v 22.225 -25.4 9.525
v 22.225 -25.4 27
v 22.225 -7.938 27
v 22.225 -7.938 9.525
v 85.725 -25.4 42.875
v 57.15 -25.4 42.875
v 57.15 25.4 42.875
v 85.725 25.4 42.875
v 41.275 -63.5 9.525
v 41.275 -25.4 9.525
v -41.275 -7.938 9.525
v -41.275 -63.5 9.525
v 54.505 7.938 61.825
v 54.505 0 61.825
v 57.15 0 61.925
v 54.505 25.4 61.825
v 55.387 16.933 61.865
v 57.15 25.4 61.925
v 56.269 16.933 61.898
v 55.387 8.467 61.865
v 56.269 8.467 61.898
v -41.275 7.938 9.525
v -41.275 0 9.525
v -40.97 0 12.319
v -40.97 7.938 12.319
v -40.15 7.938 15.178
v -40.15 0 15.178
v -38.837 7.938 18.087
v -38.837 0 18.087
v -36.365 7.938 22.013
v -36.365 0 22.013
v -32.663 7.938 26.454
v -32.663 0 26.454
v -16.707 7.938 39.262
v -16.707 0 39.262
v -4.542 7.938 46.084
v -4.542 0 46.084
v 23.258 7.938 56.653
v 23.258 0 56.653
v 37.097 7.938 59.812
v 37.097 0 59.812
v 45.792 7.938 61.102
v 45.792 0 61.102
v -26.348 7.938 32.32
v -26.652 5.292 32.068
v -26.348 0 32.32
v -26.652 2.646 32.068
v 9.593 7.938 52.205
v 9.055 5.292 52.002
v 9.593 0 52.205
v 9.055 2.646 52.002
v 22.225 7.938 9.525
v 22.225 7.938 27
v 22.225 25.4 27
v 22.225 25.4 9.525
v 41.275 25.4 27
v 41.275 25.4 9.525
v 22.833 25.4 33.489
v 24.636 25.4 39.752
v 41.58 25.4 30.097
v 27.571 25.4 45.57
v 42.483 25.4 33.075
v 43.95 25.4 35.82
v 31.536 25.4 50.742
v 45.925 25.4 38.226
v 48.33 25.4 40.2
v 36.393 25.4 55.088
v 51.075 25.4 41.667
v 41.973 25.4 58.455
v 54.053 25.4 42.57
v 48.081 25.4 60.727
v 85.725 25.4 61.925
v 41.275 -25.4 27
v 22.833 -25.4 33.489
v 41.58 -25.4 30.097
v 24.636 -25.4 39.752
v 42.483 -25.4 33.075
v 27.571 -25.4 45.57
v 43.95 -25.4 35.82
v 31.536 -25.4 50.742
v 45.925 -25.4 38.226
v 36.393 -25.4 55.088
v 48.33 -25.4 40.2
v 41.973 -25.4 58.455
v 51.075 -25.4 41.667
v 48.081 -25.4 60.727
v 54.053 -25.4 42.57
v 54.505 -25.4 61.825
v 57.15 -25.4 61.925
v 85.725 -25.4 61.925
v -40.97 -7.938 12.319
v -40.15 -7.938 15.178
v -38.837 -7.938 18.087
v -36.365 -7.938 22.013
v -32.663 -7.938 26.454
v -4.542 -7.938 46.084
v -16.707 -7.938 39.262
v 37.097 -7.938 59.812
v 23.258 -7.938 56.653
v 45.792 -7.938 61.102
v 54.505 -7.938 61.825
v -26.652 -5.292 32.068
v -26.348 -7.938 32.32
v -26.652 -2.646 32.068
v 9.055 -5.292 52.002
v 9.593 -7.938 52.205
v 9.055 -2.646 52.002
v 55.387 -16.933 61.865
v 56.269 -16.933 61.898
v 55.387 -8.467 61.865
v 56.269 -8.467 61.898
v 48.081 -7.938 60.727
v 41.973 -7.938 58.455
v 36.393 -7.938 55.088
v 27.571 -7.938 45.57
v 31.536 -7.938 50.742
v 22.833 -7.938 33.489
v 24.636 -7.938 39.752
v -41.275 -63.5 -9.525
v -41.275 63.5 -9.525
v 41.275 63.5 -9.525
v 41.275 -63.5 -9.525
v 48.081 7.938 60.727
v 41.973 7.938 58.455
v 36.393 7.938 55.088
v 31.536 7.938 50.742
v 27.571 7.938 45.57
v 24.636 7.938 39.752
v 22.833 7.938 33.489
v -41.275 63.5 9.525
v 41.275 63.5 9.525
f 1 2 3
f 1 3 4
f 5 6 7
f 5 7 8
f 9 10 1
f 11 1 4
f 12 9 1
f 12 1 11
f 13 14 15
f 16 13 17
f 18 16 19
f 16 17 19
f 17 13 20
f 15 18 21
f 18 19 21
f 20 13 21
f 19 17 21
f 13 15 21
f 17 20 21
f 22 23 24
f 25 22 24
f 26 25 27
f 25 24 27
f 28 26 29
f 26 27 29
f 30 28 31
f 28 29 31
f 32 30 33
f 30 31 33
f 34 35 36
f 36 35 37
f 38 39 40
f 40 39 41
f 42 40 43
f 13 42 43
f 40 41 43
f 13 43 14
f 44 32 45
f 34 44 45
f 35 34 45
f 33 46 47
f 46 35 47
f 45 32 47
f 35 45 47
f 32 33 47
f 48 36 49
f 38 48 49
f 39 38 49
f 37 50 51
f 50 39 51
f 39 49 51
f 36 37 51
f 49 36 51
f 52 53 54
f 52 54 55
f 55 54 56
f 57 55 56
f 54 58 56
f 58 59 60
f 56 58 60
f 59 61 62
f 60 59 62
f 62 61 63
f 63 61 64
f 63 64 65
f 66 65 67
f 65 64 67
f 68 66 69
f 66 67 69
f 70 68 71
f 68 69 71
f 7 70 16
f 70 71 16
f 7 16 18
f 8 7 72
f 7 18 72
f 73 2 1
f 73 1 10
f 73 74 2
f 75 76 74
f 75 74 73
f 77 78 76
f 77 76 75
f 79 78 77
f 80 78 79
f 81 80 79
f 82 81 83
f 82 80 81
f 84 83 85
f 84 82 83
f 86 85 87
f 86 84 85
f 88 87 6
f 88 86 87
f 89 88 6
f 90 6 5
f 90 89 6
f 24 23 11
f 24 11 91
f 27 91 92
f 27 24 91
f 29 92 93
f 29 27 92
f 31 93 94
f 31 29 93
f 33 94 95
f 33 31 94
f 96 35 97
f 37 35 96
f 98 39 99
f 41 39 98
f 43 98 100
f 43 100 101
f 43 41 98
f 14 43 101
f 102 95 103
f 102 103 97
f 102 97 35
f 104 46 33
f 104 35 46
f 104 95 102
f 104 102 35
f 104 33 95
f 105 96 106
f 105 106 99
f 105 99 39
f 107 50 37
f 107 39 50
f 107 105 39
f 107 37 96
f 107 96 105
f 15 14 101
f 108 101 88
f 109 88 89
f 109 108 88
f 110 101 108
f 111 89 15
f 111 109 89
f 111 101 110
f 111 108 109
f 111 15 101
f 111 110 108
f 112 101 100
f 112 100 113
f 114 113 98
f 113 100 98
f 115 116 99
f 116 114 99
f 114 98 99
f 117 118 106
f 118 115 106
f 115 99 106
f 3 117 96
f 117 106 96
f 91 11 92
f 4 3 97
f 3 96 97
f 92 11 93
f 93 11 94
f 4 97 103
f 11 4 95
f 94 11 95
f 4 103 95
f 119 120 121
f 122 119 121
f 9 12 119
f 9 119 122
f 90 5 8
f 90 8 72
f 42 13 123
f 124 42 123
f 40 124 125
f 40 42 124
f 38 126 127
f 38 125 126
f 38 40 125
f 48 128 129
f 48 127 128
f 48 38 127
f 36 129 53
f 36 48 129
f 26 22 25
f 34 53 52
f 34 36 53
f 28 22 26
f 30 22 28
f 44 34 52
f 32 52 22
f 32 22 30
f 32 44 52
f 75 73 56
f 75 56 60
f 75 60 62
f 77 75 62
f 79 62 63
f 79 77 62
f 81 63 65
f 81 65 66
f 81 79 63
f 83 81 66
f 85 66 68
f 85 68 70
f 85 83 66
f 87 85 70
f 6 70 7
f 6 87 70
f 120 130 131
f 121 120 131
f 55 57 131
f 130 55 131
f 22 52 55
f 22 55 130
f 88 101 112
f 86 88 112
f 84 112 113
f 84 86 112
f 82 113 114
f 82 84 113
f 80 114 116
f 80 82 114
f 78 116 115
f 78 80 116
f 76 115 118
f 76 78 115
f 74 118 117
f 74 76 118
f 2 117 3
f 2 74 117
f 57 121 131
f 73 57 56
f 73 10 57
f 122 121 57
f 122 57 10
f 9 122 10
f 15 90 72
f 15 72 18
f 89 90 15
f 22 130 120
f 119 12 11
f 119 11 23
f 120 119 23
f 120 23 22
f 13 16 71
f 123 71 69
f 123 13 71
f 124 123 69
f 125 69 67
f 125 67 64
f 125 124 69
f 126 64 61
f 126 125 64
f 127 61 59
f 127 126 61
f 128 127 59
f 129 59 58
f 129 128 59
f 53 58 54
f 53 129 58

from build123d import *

# Parameters (mm, degrees)
F1_DEPTH = 63.5
F0_W     = 25.4
F0_H     = 19.05
F2_DEPTH = 25.4
F3_DEPTH = 7.9375


with BuildPart() as f1:
    # F0 (on Front) → F1 (new body, symmetric)
    with BuildSketch(Plane.XZ):
        Polygon((22.225, 9.525), (-41.275, 9.525), (-41.275, -9.525), (41.275, -9.525), (41.275, 9.525), align=None)
    extrude(amount=F1_DEPTH, both=True)

    # F0 (on Front) → F2 (join, symmetric)
    with BuildSketch(Plane.XZ):
        with BuildLine():
            Line((22.225, 27.0002), (22.225, 9.525))
            Line((22.225, 9.525), (41.275, 9.525))
            Line((41.275, 9.525), (41.275, 27.0002))
            ThreePointArc((41.275, 27.0002), (45.9246798487, 38.2255201513), (57.15, 42.8752))
            Line((57.15, 42.8752), (60.325, 42.8752))
            Line((60.325, 42.8752), (60.325, 61.9252))
            Line((60.325, 61.9252), (57.15, 61.9252))
            add(Edge.make_bspline(
                [(54.5051235228, 61.8249075138), (55.3877284617, 61.8679154461), (56.2694699988, 61.9014230074), (57.15, 61.9252)],
                knots=[109.4292782466, 109.4292782466, 109.4292782466, 109.4292782466, 111.5045361635, 111.5045361635, 111.5045361635, 111.5045361635], degree=3))
            ThreePointArc((54.5051235228, 61.8249075138), (31.5362543156, 50.7423914957), (22.225, 27.0002))
        make_face()
        with Locations((73.025, 52.4002)):
            Rectangle(F0_W, F0_H)
    extrude(amount=F2_DEPTH, both=True)

    # F0 (on Front) → F3 (join, symmetric)
    with BuildSketch(Plane.XZ):
        with BuildLine():
            add(Edge.make_bspline(
                [(-41.275, 9.525), (-40.9758715935, 30.8734704245), (7.9649702933, 59.5570800062), (54.5051235228, 61.8249075138)],
                knots=[0, 0, 0, 0, 109.4292782466, 109.4292782466, 109.4292782466, 109.4292782466], degree=3))
            Line((-41.275, 9.525), (22.225, 9.525))
            Line((22.225, 9.525), (22.225, 27.0002))
            ThreePointArc((22.225, 27.0002), (31.5362543156, 50.7423914957), (54.5051235228, 61.8249075138))
        make_face()
    extrude(amount=F3_DEPTH, both=True)


solid = f1.part
